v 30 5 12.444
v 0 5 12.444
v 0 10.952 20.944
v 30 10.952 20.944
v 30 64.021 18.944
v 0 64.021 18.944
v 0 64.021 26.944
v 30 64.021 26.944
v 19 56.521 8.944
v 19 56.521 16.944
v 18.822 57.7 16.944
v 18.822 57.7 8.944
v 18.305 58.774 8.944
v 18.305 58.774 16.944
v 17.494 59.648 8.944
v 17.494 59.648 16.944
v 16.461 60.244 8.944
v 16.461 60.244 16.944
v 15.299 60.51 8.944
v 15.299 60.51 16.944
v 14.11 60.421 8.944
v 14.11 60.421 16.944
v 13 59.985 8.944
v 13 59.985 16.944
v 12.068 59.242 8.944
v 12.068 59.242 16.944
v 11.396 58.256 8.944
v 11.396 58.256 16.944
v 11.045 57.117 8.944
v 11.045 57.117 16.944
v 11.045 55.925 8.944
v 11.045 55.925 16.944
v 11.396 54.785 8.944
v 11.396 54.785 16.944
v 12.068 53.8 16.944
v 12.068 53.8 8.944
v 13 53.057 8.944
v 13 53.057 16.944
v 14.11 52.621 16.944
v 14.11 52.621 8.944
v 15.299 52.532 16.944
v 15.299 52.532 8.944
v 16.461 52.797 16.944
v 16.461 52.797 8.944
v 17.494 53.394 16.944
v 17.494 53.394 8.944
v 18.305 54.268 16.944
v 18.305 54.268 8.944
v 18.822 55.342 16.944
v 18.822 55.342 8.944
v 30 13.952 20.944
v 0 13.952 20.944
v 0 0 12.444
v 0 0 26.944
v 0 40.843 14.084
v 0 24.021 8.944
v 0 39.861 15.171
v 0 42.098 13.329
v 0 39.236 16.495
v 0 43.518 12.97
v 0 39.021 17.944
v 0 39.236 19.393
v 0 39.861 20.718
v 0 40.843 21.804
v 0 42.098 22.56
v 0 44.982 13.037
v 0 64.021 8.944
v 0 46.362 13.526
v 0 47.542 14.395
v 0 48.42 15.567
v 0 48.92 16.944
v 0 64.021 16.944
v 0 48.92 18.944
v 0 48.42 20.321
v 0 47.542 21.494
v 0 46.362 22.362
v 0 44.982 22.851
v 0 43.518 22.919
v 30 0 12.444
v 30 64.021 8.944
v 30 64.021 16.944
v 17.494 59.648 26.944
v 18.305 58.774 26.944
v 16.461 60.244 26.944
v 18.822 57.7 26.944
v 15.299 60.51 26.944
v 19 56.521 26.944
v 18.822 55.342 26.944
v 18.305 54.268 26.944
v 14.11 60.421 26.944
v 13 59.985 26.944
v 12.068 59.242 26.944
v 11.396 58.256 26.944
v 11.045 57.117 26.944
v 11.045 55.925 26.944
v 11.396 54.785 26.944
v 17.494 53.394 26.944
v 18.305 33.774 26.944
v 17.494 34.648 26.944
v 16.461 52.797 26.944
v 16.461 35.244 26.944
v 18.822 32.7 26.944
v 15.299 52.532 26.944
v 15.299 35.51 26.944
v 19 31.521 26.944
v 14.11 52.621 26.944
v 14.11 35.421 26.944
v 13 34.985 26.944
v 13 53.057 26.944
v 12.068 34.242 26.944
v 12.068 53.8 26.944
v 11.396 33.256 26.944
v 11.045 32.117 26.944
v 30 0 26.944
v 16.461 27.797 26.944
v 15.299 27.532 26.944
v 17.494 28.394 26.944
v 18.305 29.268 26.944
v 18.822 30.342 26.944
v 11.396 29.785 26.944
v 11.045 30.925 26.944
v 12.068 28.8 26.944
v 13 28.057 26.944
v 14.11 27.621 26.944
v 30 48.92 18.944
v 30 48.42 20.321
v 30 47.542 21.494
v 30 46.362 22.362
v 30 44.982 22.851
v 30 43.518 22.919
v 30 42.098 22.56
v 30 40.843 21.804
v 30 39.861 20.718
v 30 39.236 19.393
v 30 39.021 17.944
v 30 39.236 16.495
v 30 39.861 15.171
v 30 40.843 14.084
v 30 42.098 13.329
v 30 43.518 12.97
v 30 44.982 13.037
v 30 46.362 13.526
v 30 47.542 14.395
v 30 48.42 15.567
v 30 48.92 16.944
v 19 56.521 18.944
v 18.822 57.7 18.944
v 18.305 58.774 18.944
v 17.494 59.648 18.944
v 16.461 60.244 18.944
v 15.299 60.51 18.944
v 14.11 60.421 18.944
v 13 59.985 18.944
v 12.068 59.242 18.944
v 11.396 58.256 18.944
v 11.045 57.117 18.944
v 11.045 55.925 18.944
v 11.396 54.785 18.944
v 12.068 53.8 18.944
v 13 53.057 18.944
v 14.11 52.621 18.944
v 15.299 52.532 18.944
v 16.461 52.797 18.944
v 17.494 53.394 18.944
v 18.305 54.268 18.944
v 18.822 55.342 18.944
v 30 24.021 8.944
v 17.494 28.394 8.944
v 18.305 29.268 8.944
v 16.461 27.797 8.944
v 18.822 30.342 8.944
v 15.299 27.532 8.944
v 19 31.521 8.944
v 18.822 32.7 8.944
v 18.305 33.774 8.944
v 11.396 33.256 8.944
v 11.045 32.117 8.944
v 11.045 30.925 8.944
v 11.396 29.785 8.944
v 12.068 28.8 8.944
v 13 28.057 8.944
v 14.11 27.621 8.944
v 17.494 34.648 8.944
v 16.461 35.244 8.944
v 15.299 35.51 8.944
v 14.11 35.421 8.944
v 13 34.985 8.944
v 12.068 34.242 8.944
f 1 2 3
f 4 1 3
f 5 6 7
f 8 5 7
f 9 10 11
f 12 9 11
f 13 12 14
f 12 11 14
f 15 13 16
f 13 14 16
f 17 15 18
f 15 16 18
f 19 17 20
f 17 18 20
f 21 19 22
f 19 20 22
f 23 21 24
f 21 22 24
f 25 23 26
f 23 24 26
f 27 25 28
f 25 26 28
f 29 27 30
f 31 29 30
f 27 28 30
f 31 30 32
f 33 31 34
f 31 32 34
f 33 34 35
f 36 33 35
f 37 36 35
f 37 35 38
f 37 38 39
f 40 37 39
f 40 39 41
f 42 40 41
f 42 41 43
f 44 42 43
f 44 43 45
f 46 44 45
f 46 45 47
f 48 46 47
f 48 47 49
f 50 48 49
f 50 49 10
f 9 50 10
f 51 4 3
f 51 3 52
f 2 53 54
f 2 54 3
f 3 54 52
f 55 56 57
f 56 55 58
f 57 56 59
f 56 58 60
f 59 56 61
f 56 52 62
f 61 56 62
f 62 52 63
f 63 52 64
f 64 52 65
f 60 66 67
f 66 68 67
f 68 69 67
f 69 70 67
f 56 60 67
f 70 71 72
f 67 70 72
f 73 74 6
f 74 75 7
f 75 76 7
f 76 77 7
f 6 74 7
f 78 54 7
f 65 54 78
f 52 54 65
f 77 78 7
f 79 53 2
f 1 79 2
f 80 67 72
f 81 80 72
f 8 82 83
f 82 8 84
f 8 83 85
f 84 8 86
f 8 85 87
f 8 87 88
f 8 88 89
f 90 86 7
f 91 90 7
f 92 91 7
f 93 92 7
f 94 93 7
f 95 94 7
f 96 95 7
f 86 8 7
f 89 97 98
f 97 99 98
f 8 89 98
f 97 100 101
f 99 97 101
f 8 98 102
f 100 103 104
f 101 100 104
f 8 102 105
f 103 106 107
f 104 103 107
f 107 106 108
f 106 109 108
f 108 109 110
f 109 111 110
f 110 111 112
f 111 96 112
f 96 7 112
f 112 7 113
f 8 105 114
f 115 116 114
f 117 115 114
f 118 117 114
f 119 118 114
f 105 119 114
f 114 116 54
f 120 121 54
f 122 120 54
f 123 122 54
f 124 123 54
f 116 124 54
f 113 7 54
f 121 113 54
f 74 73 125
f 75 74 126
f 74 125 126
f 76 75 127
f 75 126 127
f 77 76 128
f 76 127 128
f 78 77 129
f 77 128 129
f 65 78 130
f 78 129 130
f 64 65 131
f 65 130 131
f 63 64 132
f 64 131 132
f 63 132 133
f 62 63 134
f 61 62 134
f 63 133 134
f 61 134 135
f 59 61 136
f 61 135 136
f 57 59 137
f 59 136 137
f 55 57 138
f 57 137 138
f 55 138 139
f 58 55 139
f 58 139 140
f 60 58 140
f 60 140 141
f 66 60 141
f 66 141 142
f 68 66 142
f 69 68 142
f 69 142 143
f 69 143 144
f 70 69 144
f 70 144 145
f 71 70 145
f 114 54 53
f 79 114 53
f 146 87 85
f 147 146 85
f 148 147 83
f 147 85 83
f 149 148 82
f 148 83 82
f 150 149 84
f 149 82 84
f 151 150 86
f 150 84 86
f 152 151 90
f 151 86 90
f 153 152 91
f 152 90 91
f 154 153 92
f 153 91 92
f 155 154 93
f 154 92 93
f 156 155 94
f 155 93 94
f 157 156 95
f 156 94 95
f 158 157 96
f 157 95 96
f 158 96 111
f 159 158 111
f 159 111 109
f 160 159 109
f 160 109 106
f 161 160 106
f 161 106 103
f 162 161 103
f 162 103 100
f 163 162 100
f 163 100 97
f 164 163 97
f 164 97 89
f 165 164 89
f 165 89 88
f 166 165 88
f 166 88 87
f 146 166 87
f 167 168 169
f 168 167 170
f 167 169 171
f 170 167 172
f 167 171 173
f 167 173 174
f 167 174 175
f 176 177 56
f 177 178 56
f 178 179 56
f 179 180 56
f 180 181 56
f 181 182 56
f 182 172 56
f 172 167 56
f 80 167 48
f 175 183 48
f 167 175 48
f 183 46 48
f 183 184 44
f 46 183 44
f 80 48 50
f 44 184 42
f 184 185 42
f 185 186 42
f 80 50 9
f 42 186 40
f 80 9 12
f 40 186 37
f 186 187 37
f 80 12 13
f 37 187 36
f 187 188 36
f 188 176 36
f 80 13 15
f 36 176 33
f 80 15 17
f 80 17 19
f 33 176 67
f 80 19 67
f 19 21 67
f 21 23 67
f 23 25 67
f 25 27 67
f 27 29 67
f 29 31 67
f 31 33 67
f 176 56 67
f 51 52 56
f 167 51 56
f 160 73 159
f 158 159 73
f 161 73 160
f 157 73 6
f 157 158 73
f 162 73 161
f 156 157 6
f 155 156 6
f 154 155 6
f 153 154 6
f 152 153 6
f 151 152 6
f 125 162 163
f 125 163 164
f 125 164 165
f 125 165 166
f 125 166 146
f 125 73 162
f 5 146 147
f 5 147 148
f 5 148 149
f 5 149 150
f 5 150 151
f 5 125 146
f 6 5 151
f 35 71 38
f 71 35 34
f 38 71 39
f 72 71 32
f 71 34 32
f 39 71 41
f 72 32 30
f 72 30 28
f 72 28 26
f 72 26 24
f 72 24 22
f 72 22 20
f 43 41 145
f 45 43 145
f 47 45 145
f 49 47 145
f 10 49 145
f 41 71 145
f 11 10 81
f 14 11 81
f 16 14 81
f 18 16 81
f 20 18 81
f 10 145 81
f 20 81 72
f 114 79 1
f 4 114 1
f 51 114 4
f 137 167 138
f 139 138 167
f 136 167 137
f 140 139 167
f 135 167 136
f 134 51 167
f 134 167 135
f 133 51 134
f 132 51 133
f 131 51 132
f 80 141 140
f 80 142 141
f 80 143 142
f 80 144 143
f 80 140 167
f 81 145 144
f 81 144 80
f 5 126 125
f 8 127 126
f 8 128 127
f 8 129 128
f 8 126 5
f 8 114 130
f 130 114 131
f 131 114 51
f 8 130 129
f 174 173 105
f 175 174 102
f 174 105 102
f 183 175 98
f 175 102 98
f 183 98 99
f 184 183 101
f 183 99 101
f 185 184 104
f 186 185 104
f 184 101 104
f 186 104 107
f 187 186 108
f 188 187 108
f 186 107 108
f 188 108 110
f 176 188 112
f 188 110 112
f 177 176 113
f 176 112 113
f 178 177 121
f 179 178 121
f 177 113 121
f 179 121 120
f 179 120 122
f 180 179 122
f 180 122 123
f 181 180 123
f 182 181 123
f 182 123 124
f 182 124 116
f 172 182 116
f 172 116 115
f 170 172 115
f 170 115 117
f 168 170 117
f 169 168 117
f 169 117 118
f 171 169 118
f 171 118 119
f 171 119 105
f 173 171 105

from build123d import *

# Parameters (mm, degrees)
F1_DEPTH = 30
F3_W     = 19.6464200949
F3_H     = 2
F4_DEPTH = 30.001
F2_R     = 5
F5_DEPTH = 30.001
F6_R     = 4
F7_DEPTH = 18.001
F8_DEPTH = 30.001


# Not quite as in the source:
# - a feature names something its author has since deleted; it is built from what else it names


with BuildPart() as f1:
    # F0 (on Right) → F1 (new body)
    with BuildSketch(Plane.YZ):
        Polygon((13.9517640748, 20.9442070276), (24.0209596489, 8.9442070276), (64.0209596489, 8.9442070276), (64.0209596489, 26.9442070276), (0, 26.9442070276), (0, 12.4442070276), (5, 12.4442070276), (10.9517640748, 20.9442070276), align=None)
    extrude(amount=F1_DEPTH)

    # F3 (on face) → F4 (cut, through all)
    with BuildSketch(Plane.YZ.offset(30)):
        with Locations((56.7216197717, 17.9442070276)):
            Rectangle(F3_W, F3_H)
    extrude(amount=-F4_DEPTH, mode=Mode.SUBTRACT)

    # F2 (on face) → F5 (cut, through all)
    with BuildSketch(Plane.YZ.offset(30)):
        with Locations((44.0209596489, 17.9442070276)):
            Circle(F2_R)
    extrude(amount=-F5_DEPTH, mode=Mode.SUBTRACT)

    # F6 (on face) → F7 (cut, through all)
    with BuildSketch(Plane.XY.offset(26.9442070276)):
        with Locations((15, 31.5209596489)):
            Circle(F6_R)
        with Locations((15, 56.5209596489)):
            Circle(F6_R)
    extrude(amount=-F7_DEPTH, mode=Mode.SUBTRACT)

    # F2 (on face) → F8 (cut, through all)
    with BuildSketch(Plane.YZ.offset(30)):
        with Locations((44.0209596489, 17.9442070276)):
            Circle(F2_R)
    extrude(amount=-F8_DEPTH, mode=Mode.SUBTRACT)


solid = f1.part
